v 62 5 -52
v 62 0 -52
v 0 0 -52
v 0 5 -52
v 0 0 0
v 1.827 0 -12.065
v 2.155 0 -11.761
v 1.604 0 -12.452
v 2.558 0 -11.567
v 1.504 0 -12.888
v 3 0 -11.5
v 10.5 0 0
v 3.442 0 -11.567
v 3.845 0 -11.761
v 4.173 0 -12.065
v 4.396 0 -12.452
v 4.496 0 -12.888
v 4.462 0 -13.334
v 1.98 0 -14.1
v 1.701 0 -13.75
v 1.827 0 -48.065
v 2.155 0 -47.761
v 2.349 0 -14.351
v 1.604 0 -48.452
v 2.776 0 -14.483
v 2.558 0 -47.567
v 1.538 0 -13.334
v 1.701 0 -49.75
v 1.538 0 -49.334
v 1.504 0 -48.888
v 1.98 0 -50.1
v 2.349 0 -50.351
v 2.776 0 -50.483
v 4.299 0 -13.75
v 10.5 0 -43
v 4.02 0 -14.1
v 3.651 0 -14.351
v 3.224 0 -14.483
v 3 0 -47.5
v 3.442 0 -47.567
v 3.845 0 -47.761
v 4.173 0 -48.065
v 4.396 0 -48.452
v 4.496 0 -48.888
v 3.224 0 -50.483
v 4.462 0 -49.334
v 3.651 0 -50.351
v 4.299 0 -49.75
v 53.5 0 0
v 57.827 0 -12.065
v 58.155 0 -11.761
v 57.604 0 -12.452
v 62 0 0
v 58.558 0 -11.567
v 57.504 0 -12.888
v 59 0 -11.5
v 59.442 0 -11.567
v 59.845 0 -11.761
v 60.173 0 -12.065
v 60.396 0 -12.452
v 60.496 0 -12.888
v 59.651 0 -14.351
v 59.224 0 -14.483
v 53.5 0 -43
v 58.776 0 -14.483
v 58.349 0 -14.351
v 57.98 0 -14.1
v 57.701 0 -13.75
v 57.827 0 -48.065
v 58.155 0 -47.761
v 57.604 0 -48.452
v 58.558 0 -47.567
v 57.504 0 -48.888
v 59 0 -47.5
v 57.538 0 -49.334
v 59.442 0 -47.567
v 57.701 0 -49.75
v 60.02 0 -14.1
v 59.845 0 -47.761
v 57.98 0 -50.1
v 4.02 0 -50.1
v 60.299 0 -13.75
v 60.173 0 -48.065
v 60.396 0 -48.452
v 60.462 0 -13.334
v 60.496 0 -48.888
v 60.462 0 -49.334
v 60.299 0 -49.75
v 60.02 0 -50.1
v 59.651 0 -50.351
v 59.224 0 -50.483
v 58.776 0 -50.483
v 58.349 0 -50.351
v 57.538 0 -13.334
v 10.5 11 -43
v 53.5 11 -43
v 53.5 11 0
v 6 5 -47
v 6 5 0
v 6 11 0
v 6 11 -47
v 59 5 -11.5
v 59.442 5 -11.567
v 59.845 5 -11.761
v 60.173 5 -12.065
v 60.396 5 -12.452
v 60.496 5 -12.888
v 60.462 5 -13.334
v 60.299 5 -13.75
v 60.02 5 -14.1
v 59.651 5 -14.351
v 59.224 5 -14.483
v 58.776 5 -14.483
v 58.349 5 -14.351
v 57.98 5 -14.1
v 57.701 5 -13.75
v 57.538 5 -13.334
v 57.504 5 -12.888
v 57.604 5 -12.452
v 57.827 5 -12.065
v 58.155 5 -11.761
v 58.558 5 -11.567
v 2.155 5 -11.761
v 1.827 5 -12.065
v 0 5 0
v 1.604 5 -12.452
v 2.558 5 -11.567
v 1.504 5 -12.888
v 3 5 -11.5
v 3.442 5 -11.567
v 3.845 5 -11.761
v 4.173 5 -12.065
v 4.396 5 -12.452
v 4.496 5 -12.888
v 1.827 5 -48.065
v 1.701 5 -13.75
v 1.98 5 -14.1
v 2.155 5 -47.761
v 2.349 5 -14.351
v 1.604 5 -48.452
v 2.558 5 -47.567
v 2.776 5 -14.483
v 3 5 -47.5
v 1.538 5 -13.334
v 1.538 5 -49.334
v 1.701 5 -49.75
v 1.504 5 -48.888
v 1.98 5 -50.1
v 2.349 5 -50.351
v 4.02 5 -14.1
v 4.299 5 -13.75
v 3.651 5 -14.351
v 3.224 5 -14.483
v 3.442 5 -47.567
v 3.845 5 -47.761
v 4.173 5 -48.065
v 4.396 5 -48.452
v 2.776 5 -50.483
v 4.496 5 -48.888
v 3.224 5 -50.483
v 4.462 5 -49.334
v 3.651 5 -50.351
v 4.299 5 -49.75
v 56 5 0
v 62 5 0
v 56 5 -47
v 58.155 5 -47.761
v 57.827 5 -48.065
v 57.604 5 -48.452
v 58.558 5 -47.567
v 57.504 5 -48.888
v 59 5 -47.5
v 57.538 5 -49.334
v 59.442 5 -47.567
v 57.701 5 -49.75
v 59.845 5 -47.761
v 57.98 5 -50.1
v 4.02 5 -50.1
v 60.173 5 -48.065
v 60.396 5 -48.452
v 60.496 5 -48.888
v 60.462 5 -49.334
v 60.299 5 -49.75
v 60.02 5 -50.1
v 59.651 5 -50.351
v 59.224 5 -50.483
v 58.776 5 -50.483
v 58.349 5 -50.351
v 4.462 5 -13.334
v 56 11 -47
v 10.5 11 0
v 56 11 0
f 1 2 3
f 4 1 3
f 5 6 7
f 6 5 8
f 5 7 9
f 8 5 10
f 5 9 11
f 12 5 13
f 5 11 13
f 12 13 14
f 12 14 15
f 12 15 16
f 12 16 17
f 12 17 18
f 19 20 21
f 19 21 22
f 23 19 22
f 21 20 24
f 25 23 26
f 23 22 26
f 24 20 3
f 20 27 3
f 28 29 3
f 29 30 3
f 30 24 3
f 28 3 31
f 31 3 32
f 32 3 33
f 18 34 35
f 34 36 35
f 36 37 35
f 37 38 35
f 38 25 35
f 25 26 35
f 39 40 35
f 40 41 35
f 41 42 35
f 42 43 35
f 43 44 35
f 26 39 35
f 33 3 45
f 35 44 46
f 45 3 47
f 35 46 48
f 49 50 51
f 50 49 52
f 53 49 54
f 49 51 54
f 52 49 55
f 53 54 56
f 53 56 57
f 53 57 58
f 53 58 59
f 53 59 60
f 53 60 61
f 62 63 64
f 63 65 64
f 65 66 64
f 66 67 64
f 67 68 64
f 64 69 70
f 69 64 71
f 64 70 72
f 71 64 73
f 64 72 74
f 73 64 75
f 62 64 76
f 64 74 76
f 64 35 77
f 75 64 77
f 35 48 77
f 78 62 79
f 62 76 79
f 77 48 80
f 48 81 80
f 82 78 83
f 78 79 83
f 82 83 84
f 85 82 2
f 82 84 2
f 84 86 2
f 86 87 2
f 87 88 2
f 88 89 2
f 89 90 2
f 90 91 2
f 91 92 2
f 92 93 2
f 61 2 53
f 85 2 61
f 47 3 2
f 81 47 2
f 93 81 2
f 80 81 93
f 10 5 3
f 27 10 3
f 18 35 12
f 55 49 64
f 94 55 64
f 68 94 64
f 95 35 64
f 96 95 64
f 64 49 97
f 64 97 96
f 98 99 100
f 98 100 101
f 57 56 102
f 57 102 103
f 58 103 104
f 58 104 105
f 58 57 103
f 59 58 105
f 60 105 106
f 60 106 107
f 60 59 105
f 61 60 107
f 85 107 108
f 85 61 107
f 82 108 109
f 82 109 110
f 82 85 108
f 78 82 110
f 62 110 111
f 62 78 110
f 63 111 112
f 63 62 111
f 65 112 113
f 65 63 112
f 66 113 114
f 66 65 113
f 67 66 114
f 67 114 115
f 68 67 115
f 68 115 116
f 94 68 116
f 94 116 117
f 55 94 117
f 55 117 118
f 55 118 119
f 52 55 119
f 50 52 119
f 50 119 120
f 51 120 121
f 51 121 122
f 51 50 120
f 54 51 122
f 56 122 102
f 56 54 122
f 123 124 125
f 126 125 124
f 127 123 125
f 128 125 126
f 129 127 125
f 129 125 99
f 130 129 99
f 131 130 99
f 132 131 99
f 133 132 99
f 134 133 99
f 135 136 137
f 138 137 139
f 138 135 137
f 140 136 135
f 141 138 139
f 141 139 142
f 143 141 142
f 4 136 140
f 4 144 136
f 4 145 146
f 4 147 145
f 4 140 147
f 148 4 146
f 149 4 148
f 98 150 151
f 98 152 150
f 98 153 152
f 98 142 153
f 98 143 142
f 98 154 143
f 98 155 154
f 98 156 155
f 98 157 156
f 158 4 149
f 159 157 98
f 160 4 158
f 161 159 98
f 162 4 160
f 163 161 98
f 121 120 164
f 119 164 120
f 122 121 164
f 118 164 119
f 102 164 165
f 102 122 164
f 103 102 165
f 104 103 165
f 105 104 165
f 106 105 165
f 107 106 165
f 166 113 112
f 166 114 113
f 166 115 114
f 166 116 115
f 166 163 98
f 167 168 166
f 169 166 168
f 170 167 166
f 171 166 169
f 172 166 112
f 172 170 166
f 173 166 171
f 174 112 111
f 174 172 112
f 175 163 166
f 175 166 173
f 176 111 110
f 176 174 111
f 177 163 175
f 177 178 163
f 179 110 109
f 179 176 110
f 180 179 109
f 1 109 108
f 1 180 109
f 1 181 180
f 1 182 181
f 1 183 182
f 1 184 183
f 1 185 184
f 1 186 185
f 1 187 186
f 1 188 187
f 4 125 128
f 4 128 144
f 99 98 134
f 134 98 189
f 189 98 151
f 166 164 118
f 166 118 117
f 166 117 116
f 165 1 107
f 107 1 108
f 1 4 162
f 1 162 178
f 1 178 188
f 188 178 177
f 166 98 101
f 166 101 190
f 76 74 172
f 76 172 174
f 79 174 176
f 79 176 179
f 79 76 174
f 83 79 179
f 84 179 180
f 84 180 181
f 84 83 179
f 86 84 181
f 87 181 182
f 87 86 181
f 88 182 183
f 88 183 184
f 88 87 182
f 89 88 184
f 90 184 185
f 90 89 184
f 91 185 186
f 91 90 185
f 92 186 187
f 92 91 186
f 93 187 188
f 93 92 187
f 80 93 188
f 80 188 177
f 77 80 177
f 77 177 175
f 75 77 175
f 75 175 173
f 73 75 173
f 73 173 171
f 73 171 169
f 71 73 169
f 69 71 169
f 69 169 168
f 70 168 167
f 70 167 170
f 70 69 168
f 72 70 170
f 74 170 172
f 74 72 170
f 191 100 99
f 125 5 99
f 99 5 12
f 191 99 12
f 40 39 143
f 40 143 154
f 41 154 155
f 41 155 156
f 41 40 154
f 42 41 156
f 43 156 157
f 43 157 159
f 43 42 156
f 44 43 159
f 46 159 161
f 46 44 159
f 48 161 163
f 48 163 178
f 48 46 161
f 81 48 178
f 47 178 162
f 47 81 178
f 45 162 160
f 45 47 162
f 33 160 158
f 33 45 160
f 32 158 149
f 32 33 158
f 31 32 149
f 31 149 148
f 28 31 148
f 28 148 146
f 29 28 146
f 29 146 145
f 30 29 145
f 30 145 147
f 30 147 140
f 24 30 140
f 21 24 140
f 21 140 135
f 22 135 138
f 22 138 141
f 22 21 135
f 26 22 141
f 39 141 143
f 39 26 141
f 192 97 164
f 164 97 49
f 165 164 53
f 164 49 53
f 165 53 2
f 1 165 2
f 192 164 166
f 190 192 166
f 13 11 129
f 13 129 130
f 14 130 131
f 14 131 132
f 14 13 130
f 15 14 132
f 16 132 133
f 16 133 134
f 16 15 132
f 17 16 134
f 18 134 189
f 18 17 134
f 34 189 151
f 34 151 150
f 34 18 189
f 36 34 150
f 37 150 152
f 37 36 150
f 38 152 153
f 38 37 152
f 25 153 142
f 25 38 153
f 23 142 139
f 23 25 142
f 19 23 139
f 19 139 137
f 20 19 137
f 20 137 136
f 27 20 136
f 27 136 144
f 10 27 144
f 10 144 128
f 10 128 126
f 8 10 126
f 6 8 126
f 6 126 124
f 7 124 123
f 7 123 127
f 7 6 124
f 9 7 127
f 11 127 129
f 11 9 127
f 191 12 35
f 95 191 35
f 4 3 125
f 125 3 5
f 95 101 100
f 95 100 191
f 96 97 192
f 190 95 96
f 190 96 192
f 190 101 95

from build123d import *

# Parameters (mm, degrees)
IZIM1_R                     = 1.5
Y_KSEKLIK_EKSTR_ZYON1_DEPTH = 5
IZIM1_3_W                   = 50
IZIM1_3_H                   = 47
IZIM1_3_R                   = 2
Y_KSEKLIK_EKSTR_ZYON2_DEPTH = 11
IZIM4_W                     = 43
IZIM4_H                     = 43
IZIM4_R                     = 2
KES_EKSTR_ZYON9_DEPTH       = 20


with BuildPart() as part:
    # Çizim1 → Yükseklik-Ekstrüzyon1 (new body)
    with BuildSketch(Plane(origin=(0, 0, 0), x_dir=(1, 0, 0), z_dir=(0, 1, 0))):
        Polygon((0, 52), (0, 0), (6, 0), (6, 47), (56, 47), (56, 0), (62, 0), (62, 52), align=None)
        with Locations((3, 13)):
            Circle(IZIM1_R, mode=Mode.SUBTRACT)
        with Locations((59, 13)):
            Circle(IZIM1_R, mode=Mode.SUBTRACT)
        with Locations((3, 49)):
            Circle(IZIM1_R, mode=Mode.SUBTRACT)
        with Locations((59, 49)):
            Circle(IZIM1_R, mode=Mode.SUBTRACT)
    extrude(amount=Y_KSEKLIK_EKSTR_ZYON1_DEPTH)

    # Çizim1<3> → Yükseklik-Ekstrüzyon2 (add)
    with BuildSketch(Plane(origin=(0, 0, 0), x_dir=(1, 0, 0), z_dir=(0, 1, 0))):
        with Locations((31, 23.5)):
            Rectangle(IZIM1_3_W, IZIM1_3_H)
        with Locations((16.5, 5.5)):
            Circle(IZIM1_3_R, mode=Mode.SUBTRACT)
        with Locations((47.5, 5.5)):
            Circle(IZIM1_3_R, mode=Mode.SUBTRACT)
        with Locations((16.5, 36.5)):
            Circle(IZIM1_3_R, mode=Mode.SUBTRACT)
        with Locations((47.5, 36.5)):
            Circle(IZIM1_3_R, mode=Mode.SUBTRACT)
    extrude(amount=Y_KSEKLIK_EKSTR_ZYON2_DEPTH)

    # Çizim4 → Kes-Ekstrüzyon9 (cut)
    with BuildSketch(Plane(origin=(0, 0, 0), x_dir=(1, 0, 0), z_dir=(0, 1, 0))):
        with Locations((32, 21.5)):
            Rectangle(IZIM4_W, IZIM4_H)
        with Locations((16.5, 36.5)):
            Circle(IZIM4_R, mode=Mode.SUBTRACT)
        with Locations((47.5, 36.5)):
            Circle(IZIM4_R, mode=Mode.SUBTRACT)
        with Locations((47.5, 5.5)):
            Circle(IZIM4_R, mode=Mode.SUBTRACT)
        with Locations((16.5, 5.5)):
            Circle(IZIM4_R, mode=Mode.SUBTRACT)
    extrude(amount=KES_EKSTR_ZYON9_DEPTH, mode=Mode.SUBTRACT)


solid = part.part
